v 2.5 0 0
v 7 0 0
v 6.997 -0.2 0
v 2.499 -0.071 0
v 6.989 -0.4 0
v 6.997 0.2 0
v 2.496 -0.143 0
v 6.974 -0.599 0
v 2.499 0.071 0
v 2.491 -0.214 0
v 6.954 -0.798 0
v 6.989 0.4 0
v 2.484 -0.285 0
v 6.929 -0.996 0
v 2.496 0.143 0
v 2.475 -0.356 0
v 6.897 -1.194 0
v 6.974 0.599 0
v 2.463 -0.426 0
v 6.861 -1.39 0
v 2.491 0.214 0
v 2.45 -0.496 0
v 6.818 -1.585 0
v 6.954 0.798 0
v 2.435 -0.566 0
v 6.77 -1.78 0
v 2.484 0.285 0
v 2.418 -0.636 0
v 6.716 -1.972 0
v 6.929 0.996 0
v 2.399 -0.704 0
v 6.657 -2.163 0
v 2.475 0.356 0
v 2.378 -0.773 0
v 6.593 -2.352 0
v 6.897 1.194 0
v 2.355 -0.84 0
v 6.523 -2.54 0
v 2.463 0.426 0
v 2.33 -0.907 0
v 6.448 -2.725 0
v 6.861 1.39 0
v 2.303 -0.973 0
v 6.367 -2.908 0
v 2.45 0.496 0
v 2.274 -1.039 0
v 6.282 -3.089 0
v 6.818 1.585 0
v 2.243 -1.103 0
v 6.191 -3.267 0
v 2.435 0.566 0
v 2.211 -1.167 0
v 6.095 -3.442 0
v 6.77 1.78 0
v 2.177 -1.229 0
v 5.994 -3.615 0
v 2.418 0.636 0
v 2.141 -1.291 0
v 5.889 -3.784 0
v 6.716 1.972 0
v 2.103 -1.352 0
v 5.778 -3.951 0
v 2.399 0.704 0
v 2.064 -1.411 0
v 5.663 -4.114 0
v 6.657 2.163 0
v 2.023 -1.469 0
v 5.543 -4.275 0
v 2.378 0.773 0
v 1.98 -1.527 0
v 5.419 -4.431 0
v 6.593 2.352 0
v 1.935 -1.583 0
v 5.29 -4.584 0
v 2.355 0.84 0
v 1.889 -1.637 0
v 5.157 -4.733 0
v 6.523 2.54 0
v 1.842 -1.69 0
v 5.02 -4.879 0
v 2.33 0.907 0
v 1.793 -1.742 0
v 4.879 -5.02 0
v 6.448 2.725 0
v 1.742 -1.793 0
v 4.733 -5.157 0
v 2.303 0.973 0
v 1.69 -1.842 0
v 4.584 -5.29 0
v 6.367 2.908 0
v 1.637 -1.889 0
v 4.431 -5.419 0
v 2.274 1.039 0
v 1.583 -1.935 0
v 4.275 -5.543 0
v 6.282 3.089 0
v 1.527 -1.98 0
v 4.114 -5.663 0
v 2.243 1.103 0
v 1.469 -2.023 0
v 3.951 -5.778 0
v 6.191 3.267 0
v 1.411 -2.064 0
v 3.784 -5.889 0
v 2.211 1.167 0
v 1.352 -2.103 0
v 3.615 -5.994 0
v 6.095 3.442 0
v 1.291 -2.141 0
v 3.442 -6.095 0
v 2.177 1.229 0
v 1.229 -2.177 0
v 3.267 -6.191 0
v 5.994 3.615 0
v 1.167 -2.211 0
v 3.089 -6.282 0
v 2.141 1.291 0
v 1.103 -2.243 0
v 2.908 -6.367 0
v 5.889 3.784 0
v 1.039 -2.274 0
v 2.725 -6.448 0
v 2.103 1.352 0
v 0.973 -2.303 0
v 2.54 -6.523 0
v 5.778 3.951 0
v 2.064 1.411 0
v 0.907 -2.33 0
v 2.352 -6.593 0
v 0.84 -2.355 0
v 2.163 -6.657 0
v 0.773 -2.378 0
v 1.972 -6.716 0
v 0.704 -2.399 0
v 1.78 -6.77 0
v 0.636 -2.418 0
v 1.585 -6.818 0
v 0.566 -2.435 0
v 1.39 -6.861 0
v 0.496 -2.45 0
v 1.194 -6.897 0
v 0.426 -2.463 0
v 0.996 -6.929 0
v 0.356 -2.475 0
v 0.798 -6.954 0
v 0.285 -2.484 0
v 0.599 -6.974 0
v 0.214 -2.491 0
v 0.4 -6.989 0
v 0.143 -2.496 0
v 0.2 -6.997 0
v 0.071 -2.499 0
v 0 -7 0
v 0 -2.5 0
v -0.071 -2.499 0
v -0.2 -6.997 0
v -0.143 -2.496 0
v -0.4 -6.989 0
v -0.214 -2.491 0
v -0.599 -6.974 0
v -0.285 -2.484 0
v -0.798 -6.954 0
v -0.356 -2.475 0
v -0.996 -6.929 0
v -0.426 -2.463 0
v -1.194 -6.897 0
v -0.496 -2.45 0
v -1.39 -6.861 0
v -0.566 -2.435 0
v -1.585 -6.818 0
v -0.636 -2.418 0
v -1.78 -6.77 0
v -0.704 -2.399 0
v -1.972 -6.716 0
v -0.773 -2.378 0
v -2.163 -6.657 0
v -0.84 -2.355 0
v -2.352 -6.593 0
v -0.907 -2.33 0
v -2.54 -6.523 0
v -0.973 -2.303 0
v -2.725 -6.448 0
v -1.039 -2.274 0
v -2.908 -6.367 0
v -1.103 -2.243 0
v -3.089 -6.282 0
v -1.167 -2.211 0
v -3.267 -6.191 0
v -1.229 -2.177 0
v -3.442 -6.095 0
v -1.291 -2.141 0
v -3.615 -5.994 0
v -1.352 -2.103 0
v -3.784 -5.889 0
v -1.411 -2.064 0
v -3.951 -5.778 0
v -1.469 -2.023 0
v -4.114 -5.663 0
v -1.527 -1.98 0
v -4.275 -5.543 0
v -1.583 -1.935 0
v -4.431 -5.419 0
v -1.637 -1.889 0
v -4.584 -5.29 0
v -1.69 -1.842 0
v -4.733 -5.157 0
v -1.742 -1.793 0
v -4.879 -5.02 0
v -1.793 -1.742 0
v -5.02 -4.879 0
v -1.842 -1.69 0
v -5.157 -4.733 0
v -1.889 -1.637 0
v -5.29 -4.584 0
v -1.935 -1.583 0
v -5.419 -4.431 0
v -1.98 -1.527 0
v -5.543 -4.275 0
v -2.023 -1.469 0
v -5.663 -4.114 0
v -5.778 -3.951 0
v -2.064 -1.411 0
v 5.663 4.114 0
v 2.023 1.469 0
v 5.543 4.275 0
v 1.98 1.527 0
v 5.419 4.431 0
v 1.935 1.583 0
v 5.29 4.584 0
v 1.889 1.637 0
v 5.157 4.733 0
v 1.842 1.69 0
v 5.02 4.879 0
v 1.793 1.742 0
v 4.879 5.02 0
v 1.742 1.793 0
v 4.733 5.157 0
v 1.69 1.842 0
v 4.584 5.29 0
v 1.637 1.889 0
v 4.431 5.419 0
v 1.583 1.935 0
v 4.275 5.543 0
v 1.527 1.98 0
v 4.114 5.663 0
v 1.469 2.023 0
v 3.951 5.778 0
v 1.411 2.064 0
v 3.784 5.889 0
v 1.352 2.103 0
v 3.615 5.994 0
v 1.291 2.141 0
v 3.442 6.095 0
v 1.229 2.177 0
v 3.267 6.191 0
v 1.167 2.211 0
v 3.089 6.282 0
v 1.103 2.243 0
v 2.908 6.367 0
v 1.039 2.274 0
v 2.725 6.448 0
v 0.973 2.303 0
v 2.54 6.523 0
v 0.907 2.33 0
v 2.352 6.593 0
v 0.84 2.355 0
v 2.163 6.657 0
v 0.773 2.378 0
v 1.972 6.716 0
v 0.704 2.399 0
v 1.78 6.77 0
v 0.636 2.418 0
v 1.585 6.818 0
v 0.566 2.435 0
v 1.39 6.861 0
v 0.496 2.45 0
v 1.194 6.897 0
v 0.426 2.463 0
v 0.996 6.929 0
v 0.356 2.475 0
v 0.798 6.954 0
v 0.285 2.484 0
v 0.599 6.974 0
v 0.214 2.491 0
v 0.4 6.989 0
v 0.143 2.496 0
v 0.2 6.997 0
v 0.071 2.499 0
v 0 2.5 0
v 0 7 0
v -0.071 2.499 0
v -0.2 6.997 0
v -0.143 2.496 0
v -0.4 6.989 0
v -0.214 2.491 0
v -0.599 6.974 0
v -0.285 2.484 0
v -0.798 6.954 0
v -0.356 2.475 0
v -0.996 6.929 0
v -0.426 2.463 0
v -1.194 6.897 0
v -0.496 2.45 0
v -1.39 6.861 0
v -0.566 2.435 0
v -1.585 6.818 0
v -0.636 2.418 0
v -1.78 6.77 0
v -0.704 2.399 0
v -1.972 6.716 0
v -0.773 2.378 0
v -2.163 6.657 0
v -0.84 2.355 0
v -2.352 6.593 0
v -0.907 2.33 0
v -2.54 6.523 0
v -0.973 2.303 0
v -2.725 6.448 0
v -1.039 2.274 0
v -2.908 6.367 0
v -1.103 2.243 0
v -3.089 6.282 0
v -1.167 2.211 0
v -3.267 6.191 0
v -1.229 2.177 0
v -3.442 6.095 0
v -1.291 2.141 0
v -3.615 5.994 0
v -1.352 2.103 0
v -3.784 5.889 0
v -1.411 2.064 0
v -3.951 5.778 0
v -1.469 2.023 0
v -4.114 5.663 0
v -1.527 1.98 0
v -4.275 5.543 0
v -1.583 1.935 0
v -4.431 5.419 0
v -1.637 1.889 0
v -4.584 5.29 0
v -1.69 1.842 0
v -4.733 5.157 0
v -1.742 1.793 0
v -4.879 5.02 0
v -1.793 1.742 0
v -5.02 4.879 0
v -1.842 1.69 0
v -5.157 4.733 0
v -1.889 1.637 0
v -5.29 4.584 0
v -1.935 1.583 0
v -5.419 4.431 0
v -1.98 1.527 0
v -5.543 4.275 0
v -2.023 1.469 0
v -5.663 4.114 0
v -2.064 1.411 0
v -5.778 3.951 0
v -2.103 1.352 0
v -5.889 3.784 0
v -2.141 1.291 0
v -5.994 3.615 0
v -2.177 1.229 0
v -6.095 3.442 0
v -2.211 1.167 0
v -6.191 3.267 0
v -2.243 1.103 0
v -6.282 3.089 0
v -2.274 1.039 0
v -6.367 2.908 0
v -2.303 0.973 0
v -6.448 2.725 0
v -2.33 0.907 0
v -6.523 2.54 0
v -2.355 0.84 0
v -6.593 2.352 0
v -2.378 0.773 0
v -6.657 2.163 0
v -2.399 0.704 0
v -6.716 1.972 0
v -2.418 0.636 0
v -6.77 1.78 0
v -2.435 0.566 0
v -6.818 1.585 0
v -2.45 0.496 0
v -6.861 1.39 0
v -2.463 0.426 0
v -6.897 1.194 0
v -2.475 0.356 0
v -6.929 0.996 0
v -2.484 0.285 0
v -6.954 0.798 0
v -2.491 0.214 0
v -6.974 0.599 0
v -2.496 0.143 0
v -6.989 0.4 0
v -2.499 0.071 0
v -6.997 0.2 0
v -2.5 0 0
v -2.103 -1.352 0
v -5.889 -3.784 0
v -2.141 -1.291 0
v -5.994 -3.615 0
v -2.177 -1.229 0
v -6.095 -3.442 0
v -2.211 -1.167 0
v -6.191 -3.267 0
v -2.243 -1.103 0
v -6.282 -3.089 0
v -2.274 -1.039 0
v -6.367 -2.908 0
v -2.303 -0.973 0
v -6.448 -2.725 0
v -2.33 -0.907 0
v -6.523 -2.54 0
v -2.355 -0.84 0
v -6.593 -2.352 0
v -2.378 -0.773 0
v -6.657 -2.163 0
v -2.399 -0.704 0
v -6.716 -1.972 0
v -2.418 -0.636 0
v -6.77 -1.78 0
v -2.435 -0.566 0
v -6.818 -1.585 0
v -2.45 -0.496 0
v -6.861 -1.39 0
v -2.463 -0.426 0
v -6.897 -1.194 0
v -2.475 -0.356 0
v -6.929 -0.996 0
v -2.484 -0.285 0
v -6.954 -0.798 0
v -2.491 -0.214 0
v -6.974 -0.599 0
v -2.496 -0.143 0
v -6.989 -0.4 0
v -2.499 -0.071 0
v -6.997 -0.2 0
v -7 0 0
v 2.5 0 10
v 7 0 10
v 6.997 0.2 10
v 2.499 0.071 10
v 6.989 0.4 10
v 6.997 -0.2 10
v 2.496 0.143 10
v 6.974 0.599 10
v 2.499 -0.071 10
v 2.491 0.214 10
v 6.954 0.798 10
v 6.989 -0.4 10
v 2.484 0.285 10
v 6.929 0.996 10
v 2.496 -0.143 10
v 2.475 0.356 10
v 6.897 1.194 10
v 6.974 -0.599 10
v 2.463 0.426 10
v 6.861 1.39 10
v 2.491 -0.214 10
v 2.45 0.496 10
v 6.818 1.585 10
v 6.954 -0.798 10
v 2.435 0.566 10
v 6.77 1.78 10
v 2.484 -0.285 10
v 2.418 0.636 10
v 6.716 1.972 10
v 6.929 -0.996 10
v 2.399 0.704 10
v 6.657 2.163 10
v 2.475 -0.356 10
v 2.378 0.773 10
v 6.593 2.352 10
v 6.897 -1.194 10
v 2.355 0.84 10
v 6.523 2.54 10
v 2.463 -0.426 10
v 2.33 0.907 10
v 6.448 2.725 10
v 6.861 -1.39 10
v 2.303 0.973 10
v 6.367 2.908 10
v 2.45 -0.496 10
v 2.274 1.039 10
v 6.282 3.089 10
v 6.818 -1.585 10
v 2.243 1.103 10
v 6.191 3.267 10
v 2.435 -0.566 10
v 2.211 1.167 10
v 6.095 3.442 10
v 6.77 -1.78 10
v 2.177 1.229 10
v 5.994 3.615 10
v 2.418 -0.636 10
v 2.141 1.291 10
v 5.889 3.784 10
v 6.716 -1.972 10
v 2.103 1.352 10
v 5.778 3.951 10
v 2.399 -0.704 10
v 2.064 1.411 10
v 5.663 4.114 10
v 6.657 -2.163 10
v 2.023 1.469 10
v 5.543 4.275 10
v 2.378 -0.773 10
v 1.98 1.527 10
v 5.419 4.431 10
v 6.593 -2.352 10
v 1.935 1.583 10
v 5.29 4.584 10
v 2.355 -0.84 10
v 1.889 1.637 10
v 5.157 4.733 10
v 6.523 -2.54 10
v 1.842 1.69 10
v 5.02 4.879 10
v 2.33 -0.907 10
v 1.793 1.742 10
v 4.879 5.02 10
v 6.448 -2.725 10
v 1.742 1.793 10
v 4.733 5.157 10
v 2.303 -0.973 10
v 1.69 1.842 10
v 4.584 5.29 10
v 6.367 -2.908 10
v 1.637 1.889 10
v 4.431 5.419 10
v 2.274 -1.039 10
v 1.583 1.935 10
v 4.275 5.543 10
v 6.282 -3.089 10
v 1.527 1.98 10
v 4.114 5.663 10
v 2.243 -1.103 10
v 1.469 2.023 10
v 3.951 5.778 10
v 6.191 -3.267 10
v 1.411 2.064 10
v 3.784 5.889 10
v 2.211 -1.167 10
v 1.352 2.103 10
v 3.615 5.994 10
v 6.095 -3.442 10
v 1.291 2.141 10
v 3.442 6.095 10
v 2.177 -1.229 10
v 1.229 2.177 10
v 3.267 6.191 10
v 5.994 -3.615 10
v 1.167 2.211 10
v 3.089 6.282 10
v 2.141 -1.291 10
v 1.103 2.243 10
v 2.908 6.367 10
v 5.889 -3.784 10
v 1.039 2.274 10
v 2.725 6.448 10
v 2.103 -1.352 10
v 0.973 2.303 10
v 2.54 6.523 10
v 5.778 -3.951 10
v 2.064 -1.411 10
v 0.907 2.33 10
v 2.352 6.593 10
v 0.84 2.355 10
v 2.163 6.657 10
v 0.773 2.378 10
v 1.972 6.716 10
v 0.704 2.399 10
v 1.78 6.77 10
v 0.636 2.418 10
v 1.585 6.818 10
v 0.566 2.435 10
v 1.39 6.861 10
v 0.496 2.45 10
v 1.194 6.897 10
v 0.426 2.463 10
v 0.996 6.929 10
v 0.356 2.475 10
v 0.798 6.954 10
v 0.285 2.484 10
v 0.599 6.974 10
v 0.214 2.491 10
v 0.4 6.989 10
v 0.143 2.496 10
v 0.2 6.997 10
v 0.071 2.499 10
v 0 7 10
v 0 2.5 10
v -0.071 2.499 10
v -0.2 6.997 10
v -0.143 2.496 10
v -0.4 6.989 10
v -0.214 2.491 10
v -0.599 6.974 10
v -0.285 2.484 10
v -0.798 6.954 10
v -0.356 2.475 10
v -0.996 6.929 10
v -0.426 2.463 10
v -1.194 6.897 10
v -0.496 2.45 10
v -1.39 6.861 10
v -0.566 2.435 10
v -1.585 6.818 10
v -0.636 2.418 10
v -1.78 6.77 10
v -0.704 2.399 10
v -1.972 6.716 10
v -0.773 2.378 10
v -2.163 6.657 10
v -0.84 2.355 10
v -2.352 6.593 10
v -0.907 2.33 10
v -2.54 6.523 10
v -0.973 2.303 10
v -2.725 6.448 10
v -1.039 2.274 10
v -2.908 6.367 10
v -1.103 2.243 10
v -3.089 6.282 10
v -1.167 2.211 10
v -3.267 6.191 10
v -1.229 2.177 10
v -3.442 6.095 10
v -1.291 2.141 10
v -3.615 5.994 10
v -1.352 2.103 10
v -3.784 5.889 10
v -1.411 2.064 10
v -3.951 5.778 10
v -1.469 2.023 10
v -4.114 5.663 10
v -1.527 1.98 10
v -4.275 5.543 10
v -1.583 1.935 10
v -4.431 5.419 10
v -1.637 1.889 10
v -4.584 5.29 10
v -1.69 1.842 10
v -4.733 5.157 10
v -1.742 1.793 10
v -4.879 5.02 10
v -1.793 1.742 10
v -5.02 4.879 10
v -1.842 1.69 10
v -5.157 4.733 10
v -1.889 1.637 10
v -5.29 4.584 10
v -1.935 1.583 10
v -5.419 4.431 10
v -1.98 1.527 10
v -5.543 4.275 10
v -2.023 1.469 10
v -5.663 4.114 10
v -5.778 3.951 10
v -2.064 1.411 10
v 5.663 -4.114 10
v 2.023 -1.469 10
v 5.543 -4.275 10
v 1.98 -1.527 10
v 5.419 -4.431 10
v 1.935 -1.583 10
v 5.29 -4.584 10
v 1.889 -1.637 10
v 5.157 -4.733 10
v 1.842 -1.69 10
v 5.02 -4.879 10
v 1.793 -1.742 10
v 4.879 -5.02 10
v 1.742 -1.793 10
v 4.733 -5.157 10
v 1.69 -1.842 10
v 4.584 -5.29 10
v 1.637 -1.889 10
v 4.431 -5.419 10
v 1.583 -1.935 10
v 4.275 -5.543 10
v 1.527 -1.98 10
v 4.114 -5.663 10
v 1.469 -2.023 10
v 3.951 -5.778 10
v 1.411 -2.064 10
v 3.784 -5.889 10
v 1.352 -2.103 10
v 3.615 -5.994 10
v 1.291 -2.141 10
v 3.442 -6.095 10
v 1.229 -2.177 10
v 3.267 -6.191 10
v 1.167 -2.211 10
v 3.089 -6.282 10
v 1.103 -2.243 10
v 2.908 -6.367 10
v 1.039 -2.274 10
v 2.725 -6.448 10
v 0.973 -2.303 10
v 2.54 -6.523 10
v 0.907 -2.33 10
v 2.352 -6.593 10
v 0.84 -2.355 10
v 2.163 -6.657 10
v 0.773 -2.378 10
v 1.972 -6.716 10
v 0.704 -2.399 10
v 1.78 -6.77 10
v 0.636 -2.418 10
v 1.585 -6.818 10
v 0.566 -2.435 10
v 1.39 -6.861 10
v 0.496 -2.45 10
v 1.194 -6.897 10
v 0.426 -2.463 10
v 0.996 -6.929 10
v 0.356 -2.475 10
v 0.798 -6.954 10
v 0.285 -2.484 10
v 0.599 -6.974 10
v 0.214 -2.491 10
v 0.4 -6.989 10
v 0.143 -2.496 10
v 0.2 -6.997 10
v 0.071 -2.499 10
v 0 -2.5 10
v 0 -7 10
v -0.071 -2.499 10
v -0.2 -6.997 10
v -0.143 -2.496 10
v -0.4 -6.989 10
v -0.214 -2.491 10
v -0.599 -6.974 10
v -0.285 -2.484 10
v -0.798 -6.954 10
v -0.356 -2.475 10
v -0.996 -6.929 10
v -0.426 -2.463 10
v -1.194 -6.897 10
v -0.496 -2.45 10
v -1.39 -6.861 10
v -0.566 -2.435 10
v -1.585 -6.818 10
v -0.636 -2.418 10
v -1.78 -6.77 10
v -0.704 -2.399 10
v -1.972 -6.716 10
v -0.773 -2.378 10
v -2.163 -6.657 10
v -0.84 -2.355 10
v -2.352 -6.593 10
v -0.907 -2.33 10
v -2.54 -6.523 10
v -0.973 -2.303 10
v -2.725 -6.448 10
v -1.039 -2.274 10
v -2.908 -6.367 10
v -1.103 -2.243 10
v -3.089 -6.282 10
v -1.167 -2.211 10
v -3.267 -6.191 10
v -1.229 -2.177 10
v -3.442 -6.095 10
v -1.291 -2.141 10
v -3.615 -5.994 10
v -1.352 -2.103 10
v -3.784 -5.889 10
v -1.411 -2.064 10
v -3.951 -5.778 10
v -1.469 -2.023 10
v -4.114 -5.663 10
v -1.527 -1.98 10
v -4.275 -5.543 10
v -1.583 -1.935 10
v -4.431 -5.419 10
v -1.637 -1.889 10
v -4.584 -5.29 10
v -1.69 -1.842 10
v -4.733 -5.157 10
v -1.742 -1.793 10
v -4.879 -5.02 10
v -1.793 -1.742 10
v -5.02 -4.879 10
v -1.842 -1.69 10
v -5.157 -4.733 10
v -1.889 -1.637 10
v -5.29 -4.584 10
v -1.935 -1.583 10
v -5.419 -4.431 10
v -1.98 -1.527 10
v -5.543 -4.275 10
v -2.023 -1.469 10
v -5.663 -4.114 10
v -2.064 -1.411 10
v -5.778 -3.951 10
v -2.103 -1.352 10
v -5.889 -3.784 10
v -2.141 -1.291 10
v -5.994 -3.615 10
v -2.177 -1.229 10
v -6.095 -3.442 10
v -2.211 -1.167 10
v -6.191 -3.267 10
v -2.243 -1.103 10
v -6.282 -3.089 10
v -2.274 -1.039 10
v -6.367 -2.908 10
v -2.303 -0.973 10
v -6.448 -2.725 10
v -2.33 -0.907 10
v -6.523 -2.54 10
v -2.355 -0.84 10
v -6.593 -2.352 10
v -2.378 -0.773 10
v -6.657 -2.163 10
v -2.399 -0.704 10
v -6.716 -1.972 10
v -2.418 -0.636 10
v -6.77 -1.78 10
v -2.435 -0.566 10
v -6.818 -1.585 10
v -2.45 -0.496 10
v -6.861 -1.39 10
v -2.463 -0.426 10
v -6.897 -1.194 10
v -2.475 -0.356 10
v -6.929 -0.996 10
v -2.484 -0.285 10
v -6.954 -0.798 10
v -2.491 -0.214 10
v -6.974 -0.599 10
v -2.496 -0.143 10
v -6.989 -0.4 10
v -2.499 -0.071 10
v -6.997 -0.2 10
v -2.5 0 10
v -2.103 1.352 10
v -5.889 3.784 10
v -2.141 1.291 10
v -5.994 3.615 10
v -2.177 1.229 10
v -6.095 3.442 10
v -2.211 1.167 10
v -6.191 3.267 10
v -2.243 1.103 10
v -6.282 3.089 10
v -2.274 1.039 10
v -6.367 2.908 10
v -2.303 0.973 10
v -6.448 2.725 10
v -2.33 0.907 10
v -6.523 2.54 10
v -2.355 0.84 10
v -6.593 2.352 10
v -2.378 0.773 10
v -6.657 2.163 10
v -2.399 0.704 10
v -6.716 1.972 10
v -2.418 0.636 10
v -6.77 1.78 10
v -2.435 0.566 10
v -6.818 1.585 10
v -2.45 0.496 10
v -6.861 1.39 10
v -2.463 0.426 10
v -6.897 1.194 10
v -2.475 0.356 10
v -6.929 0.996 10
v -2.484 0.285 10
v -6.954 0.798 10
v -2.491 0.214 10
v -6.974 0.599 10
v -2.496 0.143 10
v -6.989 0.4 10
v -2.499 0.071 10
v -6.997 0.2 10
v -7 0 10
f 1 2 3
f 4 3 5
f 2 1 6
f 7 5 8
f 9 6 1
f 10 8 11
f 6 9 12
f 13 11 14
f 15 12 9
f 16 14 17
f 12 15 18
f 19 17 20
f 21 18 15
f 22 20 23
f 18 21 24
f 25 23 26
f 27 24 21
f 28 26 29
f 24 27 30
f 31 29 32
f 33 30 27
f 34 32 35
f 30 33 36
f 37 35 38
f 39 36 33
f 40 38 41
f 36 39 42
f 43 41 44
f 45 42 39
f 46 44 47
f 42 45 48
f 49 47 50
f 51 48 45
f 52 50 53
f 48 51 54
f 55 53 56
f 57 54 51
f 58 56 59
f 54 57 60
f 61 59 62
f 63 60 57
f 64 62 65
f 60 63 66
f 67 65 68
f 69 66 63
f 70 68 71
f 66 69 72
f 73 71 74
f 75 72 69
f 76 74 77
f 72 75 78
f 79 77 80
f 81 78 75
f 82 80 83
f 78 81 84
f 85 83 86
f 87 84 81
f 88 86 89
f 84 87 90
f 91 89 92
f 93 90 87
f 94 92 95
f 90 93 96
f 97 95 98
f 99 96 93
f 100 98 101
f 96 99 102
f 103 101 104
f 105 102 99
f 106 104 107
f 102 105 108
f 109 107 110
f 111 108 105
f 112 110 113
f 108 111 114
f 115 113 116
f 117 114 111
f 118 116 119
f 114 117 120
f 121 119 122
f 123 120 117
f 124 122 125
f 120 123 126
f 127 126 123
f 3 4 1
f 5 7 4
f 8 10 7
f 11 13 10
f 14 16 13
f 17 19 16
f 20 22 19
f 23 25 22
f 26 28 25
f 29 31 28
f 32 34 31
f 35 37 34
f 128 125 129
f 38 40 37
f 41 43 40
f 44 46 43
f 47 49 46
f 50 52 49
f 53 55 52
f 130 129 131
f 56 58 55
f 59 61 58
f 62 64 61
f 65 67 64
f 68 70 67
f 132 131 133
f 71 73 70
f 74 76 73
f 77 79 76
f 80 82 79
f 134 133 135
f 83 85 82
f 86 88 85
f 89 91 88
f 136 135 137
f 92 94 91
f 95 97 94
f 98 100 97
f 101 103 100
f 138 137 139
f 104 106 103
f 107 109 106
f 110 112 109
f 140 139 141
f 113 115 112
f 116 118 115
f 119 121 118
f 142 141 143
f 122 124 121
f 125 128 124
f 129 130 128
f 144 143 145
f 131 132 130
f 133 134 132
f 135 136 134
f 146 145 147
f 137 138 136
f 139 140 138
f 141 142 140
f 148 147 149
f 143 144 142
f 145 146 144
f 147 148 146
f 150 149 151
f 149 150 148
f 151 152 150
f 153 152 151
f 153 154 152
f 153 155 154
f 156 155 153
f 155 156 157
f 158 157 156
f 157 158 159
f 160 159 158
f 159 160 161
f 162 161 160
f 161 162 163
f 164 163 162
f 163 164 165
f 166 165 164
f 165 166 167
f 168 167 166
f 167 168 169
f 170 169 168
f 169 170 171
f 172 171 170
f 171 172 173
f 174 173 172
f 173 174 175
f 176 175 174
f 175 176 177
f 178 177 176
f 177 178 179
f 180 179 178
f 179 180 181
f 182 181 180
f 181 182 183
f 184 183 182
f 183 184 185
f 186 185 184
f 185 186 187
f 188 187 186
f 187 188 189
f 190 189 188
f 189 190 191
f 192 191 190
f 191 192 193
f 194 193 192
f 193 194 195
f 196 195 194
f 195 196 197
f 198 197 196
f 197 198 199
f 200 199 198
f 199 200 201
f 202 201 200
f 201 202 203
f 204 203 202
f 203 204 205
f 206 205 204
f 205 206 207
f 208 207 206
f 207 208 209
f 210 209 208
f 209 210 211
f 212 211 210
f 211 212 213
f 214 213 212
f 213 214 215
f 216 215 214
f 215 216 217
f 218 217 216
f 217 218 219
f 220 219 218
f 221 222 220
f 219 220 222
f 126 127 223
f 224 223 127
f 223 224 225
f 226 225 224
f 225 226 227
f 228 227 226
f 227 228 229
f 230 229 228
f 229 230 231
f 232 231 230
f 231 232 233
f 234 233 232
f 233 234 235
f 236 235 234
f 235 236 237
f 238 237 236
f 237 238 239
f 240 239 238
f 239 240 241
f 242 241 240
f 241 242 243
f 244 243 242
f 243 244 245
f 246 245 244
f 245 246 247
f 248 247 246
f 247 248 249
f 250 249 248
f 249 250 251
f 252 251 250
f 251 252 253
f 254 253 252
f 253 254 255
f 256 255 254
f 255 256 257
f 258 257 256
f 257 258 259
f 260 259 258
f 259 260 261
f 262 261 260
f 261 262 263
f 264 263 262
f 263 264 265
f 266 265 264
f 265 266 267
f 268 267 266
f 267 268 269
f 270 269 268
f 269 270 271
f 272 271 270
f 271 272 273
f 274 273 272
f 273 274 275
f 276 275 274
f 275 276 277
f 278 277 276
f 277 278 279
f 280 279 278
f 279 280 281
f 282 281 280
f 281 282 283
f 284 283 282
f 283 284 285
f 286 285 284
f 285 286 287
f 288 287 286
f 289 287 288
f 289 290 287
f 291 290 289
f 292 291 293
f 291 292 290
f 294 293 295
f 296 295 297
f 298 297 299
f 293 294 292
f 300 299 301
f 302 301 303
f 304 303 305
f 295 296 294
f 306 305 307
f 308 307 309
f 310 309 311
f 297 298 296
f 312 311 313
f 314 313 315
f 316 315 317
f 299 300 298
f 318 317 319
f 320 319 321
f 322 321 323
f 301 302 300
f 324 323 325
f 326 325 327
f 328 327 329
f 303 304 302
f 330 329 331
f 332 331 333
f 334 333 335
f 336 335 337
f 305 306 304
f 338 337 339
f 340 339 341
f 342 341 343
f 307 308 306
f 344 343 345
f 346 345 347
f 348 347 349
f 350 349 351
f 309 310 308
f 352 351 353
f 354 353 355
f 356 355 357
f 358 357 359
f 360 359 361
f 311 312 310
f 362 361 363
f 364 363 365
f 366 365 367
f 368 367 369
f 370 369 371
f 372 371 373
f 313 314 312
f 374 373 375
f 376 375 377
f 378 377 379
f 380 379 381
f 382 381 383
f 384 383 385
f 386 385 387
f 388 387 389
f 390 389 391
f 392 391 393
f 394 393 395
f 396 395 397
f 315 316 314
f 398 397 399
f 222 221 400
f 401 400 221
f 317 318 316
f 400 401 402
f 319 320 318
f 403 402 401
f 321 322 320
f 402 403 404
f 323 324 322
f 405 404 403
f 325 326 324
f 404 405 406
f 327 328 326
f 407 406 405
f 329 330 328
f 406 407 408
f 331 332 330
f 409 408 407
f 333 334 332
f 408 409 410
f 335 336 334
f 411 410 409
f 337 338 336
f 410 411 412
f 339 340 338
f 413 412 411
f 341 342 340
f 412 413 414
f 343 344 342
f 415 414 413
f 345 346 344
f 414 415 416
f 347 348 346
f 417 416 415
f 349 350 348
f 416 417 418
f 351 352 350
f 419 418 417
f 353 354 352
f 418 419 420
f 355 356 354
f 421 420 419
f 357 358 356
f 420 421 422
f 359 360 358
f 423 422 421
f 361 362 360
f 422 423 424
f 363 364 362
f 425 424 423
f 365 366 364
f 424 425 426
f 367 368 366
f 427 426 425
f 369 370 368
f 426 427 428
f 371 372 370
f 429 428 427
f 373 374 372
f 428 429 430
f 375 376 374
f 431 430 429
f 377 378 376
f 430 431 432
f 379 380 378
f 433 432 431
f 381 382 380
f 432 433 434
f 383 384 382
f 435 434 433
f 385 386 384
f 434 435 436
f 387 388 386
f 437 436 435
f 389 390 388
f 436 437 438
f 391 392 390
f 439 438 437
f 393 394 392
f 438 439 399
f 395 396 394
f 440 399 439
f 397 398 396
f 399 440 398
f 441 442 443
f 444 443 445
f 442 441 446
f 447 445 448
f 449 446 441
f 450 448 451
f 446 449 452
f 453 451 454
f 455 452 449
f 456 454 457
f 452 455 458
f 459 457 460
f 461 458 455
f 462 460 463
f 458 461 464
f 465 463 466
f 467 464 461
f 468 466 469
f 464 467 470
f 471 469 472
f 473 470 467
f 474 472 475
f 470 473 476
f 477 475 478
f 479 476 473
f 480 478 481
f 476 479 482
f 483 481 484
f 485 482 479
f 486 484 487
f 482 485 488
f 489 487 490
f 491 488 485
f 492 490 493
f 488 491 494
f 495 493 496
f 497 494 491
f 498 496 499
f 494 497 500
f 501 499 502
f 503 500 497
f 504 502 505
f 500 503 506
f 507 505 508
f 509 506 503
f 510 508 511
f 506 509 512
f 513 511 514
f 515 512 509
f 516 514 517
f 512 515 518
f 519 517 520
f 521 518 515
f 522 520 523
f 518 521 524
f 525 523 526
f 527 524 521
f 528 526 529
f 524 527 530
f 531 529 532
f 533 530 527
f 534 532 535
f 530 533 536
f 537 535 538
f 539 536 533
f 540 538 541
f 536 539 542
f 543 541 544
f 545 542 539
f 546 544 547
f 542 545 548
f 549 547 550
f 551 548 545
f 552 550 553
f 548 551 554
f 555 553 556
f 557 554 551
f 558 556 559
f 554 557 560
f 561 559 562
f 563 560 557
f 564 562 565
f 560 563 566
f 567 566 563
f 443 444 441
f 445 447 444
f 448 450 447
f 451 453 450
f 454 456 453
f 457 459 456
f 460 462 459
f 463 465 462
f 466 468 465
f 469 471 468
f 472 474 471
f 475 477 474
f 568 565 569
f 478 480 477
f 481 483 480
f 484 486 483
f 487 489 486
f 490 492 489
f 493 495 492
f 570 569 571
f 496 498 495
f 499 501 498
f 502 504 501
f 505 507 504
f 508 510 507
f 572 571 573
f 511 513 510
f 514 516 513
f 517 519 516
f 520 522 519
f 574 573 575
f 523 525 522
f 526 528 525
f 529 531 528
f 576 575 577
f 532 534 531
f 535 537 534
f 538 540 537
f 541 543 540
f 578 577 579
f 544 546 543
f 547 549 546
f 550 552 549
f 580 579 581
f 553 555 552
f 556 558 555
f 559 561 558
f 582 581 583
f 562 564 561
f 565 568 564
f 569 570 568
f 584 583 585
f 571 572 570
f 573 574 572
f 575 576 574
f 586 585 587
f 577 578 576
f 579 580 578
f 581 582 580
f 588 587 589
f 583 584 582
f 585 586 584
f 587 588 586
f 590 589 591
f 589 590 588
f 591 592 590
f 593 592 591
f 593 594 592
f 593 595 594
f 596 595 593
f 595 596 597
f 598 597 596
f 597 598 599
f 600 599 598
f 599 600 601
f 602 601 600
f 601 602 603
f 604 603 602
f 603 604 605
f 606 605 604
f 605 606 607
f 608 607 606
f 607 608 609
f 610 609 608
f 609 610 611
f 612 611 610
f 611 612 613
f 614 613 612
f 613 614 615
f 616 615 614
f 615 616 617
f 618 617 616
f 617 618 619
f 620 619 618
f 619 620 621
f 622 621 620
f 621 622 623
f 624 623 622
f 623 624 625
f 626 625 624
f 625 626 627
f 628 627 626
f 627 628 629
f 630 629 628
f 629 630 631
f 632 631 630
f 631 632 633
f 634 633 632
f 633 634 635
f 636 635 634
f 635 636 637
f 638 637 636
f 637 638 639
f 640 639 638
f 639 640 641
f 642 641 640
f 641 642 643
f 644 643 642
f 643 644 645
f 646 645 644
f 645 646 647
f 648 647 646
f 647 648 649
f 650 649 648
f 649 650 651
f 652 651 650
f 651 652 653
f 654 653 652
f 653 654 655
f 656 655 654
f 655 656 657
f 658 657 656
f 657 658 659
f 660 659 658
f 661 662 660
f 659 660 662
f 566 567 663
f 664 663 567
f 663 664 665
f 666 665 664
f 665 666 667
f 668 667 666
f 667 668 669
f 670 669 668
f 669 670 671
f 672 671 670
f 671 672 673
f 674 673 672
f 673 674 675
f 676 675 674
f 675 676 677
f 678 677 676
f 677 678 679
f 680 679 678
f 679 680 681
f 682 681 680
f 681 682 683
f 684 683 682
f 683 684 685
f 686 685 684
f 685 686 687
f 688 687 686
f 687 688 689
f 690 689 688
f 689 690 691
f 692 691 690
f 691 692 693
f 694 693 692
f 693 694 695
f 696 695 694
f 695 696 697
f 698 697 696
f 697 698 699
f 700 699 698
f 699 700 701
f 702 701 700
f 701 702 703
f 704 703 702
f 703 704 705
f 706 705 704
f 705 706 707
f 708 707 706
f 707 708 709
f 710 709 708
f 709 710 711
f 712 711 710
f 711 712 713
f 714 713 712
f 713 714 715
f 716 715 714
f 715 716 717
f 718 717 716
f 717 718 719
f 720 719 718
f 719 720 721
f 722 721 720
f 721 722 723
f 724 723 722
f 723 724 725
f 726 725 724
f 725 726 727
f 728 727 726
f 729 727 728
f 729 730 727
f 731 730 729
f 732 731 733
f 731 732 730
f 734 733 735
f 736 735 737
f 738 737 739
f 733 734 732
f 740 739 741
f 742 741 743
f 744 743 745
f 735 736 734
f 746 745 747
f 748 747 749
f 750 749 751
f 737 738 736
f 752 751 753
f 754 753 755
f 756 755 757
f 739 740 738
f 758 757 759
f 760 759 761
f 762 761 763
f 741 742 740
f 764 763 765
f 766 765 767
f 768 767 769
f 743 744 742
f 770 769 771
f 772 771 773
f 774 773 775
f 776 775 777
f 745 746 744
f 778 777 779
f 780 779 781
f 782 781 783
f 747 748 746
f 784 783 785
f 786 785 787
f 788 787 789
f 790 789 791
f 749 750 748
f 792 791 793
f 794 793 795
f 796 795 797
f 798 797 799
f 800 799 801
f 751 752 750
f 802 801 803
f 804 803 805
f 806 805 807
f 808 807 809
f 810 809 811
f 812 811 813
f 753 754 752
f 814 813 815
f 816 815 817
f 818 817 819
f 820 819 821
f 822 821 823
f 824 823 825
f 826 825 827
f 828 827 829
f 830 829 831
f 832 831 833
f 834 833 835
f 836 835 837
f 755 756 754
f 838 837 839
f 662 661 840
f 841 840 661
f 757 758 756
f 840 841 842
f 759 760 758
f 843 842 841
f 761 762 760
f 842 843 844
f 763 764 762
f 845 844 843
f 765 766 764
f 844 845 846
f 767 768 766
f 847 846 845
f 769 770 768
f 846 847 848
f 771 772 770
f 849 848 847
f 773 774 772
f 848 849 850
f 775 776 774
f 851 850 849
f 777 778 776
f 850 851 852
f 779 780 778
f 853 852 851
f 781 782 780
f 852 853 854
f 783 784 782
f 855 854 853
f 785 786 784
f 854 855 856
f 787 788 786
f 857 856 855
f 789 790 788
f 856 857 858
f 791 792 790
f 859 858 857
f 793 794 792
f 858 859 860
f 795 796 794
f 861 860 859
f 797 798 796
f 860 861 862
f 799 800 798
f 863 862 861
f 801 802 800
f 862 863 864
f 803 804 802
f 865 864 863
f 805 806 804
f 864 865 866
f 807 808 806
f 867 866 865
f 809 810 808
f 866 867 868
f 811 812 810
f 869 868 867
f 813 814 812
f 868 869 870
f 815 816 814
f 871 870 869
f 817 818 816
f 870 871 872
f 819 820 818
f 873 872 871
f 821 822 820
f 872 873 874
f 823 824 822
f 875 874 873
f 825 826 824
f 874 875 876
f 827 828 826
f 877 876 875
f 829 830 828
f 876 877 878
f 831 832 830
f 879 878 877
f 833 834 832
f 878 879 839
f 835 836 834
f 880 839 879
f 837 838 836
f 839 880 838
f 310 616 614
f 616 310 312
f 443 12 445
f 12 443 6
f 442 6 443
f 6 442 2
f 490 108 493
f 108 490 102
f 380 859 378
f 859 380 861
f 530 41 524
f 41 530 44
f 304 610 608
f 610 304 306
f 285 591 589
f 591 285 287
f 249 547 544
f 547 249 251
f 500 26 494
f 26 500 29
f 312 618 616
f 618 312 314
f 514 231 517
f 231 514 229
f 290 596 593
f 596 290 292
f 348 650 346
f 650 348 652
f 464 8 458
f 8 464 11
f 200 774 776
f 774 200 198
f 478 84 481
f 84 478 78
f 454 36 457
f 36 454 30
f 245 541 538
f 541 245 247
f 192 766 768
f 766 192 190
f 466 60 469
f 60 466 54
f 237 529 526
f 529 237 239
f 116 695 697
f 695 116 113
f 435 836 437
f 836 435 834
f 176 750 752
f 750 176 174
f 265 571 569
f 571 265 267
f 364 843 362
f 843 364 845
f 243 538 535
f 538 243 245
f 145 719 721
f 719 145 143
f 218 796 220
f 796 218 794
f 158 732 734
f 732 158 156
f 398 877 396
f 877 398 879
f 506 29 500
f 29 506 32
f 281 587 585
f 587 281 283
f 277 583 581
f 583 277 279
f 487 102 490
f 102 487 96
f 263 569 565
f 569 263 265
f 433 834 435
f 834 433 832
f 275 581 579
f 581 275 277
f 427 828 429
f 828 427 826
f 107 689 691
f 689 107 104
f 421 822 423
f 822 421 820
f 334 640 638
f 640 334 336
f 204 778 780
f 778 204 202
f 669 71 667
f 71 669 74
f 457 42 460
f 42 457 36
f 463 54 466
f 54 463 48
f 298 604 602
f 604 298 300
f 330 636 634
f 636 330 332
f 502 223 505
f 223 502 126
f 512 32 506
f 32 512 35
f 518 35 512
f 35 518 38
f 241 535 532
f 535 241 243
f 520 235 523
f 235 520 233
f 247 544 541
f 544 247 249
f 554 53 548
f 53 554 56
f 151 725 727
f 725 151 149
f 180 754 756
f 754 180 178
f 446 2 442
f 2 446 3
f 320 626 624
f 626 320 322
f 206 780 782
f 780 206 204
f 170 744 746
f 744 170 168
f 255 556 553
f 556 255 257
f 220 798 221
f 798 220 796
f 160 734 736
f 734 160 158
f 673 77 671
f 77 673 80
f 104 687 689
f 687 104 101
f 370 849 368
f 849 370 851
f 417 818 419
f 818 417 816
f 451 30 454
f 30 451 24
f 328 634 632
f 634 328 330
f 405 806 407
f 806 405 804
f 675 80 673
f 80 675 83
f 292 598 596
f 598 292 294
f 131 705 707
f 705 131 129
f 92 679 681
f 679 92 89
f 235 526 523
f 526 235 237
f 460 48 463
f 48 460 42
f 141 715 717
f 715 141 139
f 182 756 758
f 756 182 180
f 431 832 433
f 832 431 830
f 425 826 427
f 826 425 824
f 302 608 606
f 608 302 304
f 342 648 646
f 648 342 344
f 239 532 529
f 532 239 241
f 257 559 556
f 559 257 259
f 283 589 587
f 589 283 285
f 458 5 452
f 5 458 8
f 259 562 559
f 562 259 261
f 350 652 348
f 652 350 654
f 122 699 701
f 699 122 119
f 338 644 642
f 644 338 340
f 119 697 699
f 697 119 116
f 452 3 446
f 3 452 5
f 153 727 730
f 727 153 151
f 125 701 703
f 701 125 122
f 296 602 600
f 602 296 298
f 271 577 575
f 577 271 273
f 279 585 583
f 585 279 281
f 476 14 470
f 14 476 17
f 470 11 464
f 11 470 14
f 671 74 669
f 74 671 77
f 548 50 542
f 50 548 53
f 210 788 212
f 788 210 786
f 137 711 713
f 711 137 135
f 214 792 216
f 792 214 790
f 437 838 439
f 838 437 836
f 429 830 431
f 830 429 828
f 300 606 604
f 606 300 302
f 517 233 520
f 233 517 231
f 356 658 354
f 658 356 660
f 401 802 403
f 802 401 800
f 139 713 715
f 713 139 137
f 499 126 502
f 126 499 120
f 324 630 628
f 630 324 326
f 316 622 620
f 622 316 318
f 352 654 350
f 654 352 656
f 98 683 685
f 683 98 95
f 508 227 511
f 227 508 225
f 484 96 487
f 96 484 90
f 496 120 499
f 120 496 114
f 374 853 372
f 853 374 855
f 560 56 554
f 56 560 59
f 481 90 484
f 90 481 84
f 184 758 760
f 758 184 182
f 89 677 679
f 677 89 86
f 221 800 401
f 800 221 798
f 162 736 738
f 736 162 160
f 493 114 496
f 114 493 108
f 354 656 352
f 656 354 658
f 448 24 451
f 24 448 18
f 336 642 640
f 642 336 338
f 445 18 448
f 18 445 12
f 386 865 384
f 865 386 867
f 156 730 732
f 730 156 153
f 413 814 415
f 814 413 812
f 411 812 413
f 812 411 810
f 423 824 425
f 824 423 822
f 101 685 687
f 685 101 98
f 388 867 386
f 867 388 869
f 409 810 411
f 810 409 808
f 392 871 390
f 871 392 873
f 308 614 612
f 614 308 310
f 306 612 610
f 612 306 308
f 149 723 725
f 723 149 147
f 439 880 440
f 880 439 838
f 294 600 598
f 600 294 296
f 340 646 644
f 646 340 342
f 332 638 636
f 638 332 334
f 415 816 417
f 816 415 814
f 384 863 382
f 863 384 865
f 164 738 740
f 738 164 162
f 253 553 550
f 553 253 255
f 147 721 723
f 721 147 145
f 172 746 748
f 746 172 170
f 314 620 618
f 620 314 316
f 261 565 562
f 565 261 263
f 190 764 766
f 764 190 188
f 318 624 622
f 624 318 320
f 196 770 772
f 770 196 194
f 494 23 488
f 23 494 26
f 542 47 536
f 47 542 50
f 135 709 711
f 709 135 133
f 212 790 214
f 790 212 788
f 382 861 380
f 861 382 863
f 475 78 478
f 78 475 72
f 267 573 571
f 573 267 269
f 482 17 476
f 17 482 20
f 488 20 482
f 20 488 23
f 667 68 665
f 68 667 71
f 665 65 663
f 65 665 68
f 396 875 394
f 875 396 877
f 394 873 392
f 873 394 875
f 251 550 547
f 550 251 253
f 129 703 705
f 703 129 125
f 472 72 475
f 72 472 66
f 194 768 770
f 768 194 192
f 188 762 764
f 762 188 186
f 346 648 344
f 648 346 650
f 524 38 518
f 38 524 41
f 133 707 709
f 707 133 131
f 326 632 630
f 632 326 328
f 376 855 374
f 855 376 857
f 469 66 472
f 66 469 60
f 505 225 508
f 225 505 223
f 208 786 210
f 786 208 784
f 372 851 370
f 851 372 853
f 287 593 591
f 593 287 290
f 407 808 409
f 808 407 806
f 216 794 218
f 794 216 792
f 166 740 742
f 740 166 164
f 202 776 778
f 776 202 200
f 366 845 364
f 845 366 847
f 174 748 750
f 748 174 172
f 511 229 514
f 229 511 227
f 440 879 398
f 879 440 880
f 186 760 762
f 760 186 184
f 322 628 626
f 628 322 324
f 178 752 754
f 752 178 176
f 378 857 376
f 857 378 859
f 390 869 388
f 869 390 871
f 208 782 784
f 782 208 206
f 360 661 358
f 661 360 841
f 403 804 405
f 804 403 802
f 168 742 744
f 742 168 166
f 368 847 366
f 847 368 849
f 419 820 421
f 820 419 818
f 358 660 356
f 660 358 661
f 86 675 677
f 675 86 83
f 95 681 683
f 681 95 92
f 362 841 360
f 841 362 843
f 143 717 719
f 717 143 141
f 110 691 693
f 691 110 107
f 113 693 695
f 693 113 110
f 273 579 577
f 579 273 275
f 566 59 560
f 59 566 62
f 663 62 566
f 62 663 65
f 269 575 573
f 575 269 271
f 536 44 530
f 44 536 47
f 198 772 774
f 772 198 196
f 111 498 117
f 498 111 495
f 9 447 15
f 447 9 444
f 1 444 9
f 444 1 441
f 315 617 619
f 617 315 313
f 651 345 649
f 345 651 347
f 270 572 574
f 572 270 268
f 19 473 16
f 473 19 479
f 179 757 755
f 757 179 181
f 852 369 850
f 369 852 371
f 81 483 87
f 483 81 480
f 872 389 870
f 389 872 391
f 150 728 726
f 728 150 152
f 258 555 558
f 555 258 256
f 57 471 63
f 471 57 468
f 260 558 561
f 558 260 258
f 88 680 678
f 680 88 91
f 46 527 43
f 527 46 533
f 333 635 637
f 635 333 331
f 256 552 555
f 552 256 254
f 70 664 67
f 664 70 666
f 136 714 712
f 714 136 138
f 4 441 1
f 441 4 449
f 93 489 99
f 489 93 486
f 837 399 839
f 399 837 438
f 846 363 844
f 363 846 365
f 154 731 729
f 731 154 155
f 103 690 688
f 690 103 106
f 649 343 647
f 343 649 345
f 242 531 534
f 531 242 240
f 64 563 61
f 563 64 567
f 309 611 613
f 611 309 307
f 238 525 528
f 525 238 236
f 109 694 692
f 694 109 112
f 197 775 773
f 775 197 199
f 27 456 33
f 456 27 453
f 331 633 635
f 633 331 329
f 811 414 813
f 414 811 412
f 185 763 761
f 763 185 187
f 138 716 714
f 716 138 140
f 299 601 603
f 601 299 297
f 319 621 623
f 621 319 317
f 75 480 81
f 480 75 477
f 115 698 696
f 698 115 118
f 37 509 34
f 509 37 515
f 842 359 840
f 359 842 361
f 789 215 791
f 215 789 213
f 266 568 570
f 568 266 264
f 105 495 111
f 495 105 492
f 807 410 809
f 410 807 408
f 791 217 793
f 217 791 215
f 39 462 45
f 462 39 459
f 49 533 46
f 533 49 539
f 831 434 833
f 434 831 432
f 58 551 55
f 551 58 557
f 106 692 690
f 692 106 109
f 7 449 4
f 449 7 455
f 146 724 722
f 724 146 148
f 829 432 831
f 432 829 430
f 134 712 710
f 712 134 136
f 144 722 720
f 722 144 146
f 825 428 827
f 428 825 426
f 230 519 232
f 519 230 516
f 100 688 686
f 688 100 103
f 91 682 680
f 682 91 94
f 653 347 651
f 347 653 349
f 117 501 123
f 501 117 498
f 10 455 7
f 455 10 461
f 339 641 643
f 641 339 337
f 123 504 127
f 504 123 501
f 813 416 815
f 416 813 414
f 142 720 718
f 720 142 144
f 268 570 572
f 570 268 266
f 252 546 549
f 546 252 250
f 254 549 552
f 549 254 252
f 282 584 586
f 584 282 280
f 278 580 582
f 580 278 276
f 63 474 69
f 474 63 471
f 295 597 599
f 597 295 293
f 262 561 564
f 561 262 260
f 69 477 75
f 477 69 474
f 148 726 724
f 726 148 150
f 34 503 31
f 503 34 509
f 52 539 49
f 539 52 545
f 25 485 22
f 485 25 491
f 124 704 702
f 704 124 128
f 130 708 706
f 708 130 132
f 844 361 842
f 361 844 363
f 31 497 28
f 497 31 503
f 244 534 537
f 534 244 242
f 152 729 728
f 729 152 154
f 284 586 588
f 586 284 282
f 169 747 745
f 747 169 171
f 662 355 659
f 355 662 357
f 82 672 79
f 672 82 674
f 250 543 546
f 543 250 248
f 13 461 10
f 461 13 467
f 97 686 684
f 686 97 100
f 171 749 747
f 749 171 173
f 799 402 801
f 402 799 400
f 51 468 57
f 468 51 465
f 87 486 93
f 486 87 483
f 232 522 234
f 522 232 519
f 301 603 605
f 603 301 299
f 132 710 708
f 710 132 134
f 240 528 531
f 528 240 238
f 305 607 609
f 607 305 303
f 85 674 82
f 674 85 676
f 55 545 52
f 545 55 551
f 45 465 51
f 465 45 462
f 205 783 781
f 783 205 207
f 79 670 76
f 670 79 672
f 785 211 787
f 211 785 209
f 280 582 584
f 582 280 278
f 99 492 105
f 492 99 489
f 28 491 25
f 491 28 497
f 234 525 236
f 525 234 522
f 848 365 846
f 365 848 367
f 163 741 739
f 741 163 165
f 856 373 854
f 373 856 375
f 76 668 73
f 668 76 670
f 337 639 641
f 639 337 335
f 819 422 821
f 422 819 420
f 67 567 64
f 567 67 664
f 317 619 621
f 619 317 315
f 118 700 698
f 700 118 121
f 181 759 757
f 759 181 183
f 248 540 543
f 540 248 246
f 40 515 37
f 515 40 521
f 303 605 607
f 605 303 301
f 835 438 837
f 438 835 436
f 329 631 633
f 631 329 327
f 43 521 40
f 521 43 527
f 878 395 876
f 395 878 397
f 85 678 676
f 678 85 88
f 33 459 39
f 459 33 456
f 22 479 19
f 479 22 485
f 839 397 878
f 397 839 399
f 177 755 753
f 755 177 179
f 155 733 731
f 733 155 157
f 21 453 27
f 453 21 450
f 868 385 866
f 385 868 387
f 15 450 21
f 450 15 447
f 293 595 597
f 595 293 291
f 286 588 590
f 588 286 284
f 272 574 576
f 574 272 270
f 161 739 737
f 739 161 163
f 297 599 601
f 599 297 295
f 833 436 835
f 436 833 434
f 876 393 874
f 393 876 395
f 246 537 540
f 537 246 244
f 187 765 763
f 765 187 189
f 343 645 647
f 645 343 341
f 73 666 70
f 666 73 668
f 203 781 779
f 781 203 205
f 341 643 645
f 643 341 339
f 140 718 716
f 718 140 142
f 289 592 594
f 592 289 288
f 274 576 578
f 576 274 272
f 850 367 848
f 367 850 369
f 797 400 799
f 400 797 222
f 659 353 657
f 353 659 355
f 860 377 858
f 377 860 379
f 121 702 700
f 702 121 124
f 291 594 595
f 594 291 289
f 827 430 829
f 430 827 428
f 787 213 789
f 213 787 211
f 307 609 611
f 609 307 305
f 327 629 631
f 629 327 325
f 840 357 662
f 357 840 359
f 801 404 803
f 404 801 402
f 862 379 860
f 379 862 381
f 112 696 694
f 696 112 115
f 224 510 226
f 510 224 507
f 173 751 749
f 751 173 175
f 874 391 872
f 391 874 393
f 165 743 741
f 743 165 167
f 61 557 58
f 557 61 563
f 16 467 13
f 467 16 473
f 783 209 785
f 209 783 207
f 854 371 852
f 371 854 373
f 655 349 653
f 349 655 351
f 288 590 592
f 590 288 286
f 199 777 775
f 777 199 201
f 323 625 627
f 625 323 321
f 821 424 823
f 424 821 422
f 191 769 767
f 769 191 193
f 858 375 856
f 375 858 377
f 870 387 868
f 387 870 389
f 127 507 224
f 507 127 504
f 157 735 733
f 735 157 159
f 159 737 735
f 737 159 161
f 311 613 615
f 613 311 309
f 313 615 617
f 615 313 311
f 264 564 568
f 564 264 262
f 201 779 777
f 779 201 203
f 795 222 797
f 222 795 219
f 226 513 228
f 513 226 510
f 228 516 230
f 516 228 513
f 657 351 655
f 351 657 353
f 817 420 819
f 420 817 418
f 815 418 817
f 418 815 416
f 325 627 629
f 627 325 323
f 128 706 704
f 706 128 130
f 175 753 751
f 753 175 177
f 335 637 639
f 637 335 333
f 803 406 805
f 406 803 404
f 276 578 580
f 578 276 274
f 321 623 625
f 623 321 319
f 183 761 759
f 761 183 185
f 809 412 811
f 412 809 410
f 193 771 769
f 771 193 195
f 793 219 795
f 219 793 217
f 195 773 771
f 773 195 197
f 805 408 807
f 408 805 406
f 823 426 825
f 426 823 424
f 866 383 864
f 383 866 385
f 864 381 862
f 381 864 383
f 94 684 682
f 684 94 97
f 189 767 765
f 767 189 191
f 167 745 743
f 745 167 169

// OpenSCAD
$fn = 220;

// Timing pulley: 16 teeth, 9.75mm pitch diameter
teeth = 16;
pitch_diameter = 9.75;                 // mm
pitch_radius   = pitch_diameter/2;

// Pulley dimensions
pulley_width   = 10;                   // mm
hub_diameter   = 14;                   // mm
hub_height     = pulley_width;         // mm
bore_diameter  = 5;                    // mm

// Tooth geometry (blocky tooth so it is clearly visible)
tooth_height     = 1.2;                // mm above pitch circle
tooth_root_depth = 0.6;                // mm below pitch circle
tooth_tip_width  = 1.0;                // mm tangential at tip
tooth_root_width = 2.0;                // mm tangential at root

// Derived radii
r_root = max(0.2, pitch_radius - tooth_root_depth);
r_tip  = pitch_radius + tooth_height;

// Ensure teeth overlap into the body for a single connected solid
tooth_overlap = 0.35;                  // mm overlap into root cylinder
r_body = r_root + tooth_overlap;

// 2D tooth profile in XY plane, centered on +X axis (radial direction)
module tooth2d() {
    x0 = r_root - tooth_overlap;       // starts inside body for connectivity
    x1 = r_tip;
    w0 = tooth_root_width;
    w1 = tooth_tip_width;

    polygon(points=[
        [x0, -w0/2],
        [x0,  w0/2],
        [x1,  w1/2],
        [x1, -w1/2]
    ]);
}

module pulley_body() {
    cylinder(h=pulley_width, r=r_body, center=false);
}

module teeth_ring() {
    for (i = [0:teeth-1]) {
        rotate([0,0, i*360/teeth])
            linear_extrude(height=pulley_width, center=false, convexity=10)
                tooth2d();
    }
}

module hub() {
    cylinder(h=hub_height, r=hub_diameter/2, center=false);
}

module bore() {
    translate([0,0,-0.5])
        cylinder(h=pulley_width+1, r=bore_diameter/2, center=false);
}

difference() {
    union() {
        // All solids share the same Z range and overlap radially -> one connected solid
        hub();
        pulley_body();
        teeth_ring();
    }
    bore();
}
